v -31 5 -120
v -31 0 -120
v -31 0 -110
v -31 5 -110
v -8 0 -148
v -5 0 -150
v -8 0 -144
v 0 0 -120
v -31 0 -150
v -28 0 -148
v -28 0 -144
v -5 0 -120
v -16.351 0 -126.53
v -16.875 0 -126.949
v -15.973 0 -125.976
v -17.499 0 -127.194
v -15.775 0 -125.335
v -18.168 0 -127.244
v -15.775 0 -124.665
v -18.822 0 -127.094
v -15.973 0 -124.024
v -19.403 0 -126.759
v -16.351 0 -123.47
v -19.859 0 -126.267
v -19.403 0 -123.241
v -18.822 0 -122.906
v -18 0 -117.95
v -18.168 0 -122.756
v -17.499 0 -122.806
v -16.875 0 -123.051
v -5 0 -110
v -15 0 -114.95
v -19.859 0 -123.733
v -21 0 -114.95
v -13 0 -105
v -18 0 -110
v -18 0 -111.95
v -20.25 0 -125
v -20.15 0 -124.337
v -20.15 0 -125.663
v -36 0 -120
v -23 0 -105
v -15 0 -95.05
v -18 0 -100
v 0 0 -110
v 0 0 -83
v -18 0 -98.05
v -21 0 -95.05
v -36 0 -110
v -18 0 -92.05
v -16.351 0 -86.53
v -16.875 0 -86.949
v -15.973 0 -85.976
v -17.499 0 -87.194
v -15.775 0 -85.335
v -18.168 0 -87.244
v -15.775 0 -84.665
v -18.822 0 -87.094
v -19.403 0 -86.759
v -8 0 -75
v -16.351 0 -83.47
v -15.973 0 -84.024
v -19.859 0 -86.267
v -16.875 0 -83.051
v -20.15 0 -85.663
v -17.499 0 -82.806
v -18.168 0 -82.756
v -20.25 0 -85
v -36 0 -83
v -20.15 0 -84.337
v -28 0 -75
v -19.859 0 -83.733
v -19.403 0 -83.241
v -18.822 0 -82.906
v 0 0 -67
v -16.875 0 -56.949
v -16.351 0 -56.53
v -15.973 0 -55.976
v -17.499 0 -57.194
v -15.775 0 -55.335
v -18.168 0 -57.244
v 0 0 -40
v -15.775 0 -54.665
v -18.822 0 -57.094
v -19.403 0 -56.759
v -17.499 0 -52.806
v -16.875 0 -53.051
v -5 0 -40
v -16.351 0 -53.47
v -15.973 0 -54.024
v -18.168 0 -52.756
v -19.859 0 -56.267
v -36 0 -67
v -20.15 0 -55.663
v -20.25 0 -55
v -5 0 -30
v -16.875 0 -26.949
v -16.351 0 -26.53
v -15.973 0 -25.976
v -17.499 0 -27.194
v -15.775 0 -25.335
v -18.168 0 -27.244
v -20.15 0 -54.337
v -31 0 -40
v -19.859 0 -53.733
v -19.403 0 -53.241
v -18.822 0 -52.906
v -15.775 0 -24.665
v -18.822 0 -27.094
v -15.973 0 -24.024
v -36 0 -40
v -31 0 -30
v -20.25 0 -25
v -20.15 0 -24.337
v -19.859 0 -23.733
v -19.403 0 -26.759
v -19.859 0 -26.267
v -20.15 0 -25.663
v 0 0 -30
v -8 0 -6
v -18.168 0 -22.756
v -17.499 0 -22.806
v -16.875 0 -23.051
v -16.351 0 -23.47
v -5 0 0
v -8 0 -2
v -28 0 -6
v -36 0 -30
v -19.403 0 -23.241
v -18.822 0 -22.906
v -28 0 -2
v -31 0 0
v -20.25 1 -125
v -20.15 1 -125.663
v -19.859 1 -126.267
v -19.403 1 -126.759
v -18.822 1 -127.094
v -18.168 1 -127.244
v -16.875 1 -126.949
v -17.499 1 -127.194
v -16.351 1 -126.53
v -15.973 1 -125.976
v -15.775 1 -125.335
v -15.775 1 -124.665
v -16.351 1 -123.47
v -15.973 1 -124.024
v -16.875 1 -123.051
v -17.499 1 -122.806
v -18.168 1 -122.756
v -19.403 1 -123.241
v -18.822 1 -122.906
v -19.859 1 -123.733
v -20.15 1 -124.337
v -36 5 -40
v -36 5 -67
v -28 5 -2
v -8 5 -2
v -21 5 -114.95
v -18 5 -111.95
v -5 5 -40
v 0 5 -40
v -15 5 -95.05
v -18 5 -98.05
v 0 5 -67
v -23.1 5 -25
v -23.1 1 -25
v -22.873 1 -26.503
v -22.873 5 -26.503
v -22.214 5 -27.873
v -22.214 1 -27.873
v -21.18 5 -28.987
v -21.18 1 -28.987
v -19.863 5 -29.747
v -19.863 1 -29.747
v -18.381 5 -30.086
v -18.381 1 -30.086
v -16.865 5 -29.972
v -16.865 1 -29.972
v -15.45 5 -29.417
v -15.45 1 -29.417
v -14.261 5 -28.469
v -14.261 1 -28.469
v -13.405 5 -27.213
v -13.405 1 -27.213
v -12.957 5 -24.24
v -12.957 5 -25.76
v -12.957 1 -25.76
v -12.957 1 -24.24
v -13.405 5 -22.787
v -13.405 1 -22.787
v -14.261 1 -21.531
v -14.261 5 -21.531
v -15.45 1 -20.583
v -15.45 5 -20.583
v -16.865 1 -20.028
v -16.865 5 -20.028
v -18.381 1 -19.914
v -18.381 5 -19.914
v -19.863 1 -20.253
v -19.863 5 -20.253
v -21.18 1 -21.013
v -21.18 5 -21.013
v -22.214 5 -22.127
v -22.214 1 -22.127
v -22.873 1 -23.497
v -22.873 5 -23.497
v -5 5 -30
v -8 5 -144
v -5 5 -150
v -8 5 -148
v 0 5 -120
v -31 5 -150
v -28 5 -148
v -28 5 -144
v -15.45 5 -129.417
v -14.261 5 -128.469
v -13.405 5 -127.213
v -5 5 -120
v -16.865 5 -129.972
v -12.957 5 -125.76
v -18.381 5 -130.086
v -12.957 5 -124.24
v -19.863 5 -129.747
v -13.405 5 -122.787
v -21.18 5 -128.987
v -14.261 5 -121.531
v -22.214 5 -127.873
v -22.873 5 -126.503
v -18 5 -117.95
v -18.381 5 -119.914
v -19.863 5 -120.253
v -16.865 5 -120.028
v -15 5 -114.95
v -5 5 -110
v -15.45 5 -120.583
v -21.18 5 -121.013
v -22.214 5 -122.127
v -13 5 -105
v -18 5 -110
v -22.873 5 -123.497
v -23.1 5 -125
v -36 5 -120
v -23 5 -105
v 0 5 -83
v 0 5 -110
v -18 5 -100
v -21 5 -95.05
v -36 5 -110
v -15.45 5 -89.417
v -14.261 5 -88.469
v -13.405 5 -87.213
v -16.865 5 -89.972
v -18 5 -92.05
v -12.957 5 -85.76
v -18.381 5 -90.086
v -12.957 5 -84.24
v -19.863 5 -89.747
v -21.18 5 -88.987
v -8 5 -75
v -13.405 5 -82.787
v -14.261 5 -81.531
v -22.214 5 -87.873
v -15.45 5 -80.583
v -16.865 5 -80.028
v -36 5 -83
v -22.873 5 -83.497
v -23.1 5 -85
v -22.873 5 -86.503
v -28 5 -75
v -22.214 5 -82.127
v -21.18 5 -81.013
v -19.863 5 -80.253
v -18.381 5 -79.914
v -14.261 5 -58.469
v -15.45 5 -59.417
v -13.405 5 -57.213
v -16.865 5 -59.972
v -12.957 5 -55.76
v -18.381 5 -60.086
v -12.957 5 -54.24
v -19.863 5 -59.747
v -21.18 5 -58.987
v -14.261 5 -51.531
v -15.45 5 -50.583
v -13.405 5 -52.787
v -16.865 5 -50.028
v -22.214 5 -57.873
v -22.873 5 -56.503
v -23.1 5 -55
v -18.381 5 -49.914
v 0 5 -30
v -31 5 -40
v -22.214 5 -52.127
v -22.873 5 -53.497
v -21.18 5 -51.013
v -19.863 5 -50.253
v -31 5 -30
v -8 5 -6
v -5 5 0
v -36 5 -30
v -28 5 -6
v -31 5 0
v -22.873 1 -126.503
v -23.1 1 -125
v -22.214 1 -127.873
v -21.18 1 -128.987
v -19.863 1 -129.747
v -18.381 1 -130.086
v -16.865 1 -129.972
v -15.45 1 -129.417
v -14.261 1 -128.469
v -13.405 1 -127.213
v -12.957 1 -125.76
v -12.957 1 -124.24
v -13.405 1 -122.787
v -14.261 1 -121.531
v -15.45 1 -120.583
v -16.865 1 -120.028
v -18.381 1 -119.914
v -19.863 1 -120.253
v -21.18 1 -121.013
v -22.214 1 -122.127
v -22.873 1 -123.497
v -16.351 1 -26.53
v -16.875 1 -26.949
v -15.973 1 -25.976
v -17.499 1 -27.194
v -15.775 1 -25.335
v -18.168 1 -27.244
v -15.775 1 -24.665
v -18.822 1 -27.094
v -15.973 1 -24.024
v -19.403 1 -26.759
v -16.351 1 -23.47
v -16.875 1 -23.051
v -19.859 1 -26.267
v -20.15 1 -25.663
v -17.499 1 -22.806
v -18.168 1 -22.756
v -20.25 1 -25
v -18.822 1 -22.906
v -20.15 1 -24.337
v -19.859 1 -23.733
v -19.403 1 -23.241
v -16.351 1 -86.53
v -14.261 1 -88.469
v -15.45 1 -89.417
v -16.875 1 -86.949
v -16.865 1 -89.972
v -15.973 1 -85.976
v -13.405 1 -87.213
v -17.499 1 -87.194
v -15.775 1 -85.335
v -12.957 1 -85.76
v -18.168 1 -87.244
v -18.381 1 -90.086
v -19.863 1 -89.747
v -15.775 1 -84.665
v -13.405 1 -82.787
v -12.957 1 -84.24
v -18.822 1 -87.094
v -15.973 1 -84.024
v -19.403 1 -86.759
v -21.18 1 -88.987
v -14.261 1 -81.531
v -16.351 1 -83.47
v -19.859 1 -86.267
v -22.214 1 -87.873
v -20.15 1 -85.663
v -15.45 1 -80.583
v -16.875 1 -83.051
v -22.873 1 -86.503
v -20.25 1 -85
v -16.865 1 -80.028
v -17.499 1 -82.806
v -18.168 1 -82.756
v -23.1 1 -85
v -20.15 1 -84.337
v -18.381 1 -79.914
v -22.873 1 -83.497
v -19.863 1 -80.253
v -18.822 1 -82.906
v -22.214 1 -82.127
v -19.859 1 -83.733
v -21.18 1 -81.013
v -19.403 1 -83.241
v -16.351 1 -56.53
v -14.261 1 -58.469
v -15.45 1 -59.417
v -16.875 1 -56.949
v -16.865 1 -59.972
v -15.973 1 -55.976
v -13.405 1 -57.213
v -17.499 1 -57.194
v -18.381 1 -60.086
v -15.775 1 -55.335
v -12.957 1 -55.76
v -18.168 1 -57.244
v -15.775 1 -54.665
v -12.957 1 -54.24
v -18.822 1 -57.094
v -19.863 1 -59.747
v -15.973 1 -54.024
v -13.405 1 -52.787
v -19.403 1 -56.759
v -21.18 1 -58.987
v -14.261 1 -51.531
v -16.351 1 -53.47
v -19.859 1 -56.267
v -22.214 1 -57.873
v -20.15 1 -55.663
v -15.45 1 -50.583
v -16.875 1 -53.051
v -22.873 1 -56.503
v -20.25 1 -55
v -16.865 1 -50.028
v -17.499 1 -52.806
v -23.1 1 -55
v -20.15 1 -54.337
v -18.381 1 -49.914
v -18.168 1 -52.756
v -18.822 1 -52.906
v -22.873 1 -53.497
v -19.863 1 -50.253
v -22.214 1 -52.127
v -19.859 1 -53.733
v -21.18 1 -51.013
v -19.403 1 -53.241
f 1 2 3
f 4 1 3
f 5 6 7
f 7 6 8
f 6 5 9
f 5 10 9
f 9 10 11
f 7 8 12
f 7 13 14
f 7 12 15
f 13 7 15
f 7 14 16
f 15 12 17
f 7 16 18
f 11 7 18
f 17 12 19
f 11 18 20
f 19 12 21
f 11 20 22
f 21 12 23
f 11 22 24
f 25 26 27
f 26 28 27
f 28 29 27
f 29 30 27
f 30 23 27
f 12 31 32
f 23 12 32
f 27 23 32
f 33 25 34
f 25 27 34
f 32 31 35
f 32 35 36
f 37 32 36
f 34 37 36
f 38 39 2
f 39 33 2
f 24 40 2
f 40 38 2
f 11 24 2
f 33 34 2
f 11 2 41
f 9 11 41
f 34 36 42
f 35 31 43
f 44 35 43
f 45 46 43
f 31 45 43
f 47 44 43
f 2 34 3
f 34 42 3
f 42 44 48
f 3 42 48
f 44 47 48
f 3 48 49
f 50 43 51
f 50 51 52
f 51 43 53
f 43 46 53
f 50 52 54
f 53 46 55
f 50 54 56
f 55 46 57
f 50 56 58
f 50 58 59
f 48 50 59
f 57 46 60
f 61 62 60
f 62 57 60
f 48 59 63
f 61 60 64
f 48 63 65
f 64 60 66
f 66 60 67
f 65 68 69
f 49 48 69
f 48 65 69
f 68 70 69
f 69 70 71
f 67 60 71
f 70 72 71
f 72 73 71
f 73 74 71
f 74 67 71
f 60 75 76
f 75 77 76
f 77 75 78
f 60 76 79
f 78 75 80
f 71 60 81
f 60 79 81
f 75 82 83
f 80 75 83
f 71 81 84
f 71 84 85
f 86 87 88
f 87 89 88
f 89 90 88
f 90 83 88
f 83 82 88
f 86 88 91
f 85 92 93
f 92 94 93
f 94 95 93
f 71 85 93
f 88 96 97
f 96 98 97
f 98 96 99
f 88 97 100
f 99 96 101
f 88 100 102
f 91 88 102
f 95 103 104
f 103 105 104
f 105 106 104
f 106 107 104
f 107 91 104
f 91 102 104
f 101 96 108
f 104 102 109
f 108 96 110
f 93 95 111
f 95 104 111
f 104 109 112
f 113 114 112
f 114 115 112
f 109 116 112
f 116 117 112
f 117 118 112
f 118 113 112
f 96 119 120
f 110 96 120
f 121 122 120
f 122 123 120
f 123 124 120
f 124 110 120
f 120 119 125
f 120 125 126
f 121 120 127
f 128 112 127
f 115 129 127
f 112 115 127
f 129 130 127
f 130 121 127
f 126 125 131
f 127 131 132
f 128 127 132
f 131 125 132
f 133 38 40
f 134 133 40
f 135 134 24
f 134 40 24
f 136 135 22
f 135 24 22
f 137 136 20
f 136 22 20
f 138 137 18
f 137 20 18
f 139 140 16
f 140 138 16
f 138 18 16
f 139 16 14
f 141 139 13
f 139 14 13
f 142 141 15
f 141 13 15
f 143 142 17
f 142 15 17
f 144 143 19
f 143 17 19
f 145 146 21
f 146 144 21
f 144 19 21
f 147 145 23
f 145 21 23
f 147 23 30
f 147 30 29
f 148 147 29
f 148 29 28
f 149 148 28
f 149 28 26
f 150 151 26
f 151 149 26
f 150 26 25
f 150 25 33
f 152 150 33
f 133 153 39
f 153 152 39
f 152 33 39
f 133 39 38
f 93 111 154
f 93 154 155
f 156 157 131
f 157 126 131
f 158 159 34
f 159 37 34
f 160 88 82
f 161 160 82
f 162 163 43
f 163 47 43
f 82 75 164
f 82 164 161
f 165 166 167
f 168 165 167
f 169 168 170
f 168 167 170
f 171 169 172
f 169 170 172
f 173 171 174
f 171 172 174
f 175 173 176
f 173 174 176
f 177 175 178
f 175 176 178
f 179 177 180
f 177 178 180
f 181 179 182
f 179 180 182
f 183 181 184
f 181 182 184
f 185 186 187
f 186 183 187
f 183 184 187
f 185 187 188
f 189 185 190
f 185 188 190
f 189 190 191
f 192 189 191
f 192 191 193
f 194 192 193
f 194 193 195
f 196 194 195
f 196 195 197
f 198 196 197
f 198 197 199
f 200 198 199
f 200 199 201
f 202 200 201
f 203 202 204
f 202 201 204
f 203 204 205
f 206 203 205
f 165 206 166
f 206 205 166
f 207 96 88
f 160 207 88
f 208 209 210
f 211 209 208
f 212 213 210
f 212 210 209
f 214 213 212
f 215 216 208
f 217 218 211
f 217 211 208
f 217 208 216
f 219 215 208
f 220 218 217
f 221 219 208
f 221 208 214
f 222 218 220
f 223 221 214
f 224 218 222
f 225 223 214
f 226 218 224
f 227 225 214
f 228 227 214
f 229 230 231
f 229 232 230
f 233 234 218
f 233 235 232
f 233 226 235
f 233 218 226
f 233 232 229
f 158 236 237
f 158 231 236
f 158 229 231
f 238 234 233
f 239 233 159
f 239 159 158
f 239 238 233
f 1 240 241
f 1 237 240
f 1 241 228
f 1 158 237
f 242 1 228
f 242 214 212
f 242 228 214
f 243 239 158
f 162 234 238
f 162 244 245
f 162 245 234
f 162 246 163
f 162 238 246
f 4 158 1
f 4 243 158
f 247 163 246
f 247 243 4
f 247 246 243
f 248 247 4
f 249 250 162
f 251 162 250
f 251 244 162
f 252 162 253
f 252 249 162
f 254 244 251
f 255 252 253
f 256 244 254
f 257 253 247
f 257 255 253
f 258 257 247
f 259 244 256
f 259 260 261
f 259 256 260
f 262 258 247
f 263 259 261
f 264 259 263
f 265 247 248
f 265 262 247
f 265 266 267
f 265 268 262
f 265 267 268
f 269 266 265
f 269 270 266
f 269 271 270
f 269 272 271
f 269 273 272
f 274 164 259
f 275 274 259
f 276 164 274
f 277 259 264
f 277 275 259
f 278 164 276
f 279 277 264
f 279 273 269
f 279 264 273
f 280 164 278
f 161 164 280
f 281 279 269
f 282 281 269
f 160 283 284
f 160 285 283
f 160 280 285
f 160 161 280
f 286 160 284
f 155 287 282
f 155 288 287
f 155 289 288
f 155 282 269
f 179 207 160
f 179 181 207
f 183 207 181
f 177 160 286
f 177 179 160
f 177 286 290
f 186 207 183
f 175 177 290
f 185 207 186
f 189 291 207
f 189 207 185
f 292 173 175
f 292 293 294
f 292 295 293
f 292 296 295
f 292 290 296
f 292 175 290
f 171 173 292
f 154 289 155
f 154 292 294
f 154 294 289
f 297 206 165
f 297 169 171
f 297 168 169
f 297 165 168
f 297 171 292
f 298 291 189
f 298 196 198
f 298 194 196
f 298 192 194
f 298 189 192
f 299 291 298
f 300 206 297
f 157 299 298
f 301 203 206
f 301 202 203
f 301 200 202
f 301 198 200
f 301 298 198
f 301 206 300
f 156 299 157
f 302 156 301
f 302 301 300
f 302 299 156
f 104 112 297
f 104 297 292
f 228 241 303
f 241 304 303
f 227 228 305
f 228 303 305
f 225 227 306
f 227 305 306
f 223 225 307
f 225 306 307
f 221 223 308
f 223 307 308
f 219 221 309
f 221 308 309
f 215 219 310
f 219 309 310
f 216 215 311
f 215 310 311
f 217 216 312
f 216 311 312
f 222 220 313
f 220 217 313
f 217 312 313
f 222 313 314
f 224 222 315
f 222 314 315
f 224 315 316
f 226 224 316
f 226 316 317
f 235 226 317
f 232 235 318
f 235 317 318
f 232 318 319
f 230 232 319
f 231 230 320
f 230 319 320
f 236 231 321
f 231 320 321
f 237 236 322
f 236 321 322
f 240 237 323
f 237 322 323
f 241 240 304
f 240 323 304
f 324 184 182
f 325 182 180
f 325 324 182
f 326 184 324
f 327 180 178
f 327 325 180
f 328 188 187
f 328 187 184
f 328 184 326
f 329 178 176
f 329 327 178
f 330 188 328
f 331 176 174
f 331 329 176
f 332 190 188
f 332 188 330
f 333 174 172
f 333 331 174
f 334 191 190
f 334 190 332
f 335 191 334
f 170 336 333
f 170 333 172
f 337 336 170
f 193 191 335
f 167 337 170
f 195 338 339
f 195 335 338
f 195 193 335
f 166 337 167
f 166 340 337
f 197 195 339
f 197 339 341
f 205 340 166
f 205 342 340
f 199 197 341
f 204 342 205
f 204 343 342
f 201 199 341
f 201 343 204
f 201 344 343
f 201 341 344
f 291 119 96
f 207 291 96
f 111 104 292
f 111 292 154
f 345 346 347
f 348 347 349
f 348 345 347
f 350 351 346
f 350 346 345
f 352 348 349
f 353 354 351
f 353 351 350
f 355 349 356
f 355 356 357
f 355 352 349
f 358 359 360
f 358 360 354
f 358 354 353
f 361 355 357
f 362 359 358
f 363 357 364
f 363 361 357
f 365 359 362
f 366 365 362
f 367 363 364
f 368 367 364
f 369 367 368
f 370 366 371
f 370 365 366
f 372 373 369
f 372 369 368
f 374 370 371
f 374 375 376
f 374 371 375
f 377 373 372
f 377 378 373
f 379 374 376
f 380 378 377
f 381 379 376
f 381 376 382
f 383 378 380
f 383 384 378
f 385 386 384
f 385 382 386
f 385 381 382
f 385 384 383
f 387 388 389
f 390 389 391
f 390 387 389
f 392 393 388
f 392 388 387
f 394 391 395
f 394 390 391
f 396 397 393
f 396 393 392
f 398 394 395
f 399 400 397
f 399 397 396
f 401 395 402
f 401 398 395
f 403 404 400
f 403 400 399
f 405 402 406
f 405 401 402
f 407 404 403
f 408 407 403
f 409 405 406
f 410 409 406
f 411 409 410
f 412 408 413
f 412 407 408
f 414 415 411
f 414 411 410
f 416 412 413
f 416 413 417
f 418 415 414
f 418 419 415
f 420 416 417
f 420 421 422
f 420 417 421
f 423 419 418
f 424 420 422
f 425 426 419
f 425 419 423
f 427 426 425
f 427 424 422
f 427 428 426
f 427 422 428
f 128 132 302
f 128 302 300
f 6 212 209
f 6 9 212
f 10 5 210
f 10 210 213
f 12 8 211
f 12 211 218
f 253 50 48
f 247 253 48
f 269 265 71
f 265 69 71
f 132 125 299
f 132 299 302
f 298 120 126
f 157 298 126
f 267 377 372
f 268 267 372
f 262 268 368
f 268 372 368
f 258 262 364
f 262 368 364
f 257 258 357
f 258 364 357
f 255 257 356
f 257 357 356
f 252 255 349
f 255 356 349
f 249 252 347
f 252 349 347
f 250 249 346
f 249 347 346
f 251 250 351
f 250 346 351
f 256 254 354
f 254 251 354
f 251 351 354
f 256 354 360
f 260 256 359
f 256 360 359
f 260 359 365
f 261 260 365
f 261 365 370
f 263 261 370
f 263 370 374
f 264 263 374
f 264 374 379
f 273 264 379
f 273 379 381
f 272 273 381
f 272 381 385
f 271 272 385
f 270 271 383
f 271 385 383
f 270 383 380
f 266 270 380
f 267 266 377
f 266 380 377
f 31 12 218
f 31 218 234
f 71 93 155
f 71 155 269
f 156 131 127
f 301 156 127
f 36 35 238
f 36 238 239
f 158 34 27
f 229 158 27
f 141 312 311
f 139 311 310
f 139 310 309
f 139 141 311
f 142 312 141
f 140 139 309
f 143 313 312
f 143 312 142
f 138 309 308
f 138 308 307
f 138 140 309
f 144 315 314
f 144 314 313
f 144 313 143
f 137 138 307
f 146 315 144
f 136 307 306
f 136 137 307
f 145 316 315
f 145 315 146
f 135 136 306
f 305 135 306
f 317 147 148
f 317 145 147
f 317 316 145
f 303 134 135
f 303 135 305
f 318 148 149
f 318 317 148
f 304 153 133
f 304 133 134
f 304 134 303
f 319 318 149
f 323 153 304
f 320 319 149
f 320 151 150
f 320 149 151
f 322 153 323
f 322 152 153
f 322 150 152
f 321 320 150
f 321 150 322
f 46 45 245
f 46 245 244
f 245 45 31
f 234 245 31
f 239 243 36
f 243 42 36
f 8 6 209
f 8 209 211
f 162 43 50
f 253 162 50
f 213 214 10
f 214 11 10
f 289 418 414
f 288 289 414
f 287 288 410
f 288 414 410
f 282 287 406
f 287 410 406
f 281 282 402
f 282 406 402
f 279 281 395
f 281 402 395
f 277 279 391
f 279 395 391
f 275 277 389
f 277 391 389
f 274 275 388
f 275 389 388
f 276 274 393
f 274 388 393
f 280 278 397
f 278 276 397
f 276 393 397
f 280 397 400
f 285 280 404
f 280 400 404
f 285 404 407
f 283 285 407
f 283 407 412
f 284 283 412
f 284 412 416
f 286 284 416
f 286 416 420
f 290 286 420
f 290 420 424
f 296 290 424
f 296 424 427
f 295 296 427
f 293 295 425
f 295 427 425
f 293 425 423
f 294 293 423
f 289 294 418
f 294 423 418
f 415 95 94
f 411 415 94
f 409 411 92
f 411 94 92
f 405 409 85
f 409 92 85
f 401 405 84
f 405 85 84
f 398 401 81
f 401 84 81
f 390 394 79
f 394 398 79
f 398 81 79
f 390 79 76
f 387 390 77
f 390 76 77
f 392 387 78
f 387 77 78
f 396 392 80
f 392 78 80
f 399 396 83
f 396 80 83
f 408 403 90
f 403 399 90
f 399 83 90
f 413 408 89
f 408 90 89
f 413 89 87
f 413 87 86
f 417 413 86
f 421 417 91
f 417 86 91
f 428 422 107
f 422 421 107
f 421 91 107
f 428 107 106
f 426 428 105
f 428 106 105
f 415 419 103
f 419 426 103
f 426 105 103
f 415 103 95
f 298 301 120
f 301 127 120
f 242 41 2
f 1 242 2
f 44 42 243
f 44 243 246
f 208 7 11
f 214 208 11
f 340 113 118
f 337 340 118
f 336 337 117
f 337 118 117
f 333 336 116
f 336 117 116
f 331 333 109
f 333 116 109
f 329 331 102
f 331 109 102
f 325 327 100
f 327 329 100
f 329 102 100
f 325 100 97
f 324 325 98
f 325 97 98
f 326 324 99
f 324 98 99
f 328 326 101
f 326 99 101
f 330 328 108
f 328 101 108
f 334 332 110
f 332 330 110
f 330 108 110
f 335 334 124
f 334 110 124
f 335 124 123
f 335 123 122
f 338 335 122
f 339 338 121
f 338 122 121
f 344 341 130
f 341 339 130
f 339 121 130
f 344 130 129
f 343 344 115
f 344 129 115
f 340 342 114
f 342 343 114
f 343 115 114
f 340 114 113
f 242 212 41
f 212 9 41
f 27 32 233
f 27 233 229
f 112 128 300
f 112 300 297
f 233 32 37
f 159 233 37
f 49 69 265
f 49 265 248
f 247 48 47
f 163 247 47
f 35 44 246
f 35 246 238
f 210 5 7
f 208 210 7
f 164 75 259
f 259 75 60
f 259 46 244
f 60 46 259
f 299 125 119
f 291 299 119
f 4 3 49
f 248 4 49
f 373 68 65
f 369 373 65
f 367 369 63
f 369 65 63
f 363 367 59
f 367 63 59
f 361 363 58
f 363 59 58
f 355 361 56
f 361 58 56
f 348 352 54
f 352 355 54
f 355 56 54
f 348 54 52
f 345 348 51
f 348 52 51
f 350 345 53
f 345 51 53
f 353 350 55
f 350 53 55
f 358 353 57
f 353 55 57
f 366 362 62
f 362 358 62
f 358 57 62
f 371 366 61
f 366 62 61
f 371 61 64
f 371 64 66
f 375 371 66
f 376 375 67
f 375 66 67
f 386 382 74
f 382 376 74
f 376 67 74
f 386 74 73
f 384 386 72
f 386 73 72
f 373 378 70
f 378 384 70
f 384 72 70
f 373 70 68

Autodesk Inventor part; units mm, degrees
ref_plane "YZ Plane" through (0, 0, 0) normal (1, 0, 0) x (0, 1, 0)
ref_plane "XZ Plane" through (0, 0, 0) normal (0, 1, 0) x (-1, 0, 0)
ref_plane "XY Plane" through (0, 0, 0) normal (0, 0, 1) x (1, 0, 0)
sketch "Sketch1" plane through (0, 0, 0) normal (0, 1, 0) x (-1, 0, 0)
  line L0 (5, 0) -> (31, 0)
  line L1 (36, -30) -> (36, -120)
  line L2 (31, -150) -> (5, -150)
  line L3 (0, -120) -> (0, -30)
  circle A0 centre (18, -25) radius 5.1
  circle A1 centre (18, -55) radius 5.1
  circle A2 centre (18, -85) radius 5.1
  circle A3 centre (18, -125) radius 5.1
  line L4 (36, -30) -> (31, -30)
  line L5 (31, -30) -> (31, -40)
  line L6 (31, -40) -> (36, -40)
  line L7 (36, -120) -> (31, -120)
  line L8 (31, -120) -> (31, -110)
  line L9 (31, -110) -> (36, -110)
  line L10 (0, -30) -> (5, -30)
  line L11 (5, -30) -> (5, -40)
  line L12 (5, -40) -> (0, -40)
  line L13 (0, -120) -> (5, -120)
  line L14 (5, -120) -> (5, -110)
  line L15 (0, -110) -> (5, -110)
  circle A4 centre (18, -25) radius 2.25
  circle A5 centre (18, -55) radius 2.25
  circle A6 centre (18, -85) radius 2.25
  circle A7 centre (18, -125) radius 2.25
  line L16 (5, 0) -> (0, -30)
  line L17 (31, -150) -> (36, -120)
  line L18 (5, -150) -> (0, -120)
  line L19 (31, 0) -> (36, -30)
  line L20 (18, -100) -> (13, -105)
  line L21 (13, -105) -> (18, -110)
  line L22 (23, -105) -> (18, -110)
  line L23 (23, -105) -> (18, -100)
  line L24 (21, -114.95) -> (18, -117.95)
  line L25 (15, -114.95) -> (18, -117.95)
  line L26 (15, -114.95) -> (18, -111.95)
  line L27 (18, -111.95) -> (21, -114.95)
  line L28 (21, -95.05) -> (18, -98.05)
  line L29 (18, -98.05) -> (15, -95.05)
  line L30 (15, -95.05) -> (18, -92.05)
  line L31 (18, -92.05) -> (21, -95.05)
  line L32 (31, -150) -> (28, -150)
  line L33 (5, -150) -> (8, -150)
  line L34 (8, -148) -> (28, -148)
  line L35 (8, -148) -> (8, -144)
  line L36 (8, -144) -> (28, -144)
  line L37 (28, -144) -> (28, -148)
  line L38 (31, 0) -> (28, 0)
  line L39 (5, 0) -> (8, 0)
  line L40 (8, -2) -> (28, -2)
  line L41 (28, -2) -> (28, -6)
  line L42 (28, -6) -> (8, -6)
  line L43 (8, -6) -> (8, -2)
  line L44 (36, -75) -> (36, -83)
  line L45 (36, -75) -> (36, -67)
  line L46 (36, -67) -> (28, -75)
  line L47 (36, -83) -> (28, -75)
  line L48 (0, -75) -> (0, -83)
  line L49 (0, -75) -> (0, -67)
  line L50 (0, -67) -> (8, -75)
  line L51 (0, -83) -> (8, -75)
  point P0 (0, 0)
  point P1 (18, 0)
  point P2 (18, -150)
  dimension "d2" = 10.2
  dimension "d3" = 25
  dimension "d4" = 10.2
  dimension "d5" = 30
  dimension "d6" = 10.2
  dimension "d7" = 30
  dimension "d8" = 10.2
  dimension "d9" = 40
  dimension "d10" = 25
  dimension "d12" = 5
  dimension "d13" = 10
  dimension "d15" = 10
  dimension "d17" = 5
  dimension "d19" = 5
  dimension "d22" = 4.5
  dimension "d23" = 4.5
  dimension "d24" = 4.5
  dimension "d25" = 4.5
  dimension "d38" = 3
  dimension "d39" = 2
  dimension "d41" = 2
  dimension "d42" = 4
  dimension "d44" = 2
  dimension "d45" = 3
  dimension "d46" = 4
  dimension "d50" = 8
  dimension "d51" = 8
extrude "Extrusion1" add sketch "Sketch1" along normal blind 5 contours L0 L19 L4 L5 L6 L1 L46 L47 L9 L8 L7 L17 L2 L18 L13 L14 L15 L3 L51 L50 L12 L11 L10 L16
extrude "Extrusion2" add sketch "Sketch1" along normal blind 1 contours A0 | A1 | A2 | A3
sketch "Sketch2" plane through (0, 5, 0) normal (0, 1, 0) x (1, 0, 0)
  line L0 (-28, 75) -> (-36, 67) projected
  line L1 (-36, 110) -> (-36, 83) projected
  line L2 (-36, 67) -> (-36, 83)
  line L3 (-36, 83) -> (-28, 75) projected
  line L4 (-36, 83) -> (-28, 75)
  line L5 (-28, 75) -> (-36, 67)
  line L6 (0, 67) -> (-8, 75) projected
  line L7 (-8, 75) -> (0, 67)
  line L8 (0, 67) -> (0, 83)
  line L9 (0, 83) -> (-8, 75)
  line L10 (-36, 67) -> (0, 67)
  line L11 (-36, 83) -> (0, 83)
  point P0 (0, 0)
properties part number "Side"
